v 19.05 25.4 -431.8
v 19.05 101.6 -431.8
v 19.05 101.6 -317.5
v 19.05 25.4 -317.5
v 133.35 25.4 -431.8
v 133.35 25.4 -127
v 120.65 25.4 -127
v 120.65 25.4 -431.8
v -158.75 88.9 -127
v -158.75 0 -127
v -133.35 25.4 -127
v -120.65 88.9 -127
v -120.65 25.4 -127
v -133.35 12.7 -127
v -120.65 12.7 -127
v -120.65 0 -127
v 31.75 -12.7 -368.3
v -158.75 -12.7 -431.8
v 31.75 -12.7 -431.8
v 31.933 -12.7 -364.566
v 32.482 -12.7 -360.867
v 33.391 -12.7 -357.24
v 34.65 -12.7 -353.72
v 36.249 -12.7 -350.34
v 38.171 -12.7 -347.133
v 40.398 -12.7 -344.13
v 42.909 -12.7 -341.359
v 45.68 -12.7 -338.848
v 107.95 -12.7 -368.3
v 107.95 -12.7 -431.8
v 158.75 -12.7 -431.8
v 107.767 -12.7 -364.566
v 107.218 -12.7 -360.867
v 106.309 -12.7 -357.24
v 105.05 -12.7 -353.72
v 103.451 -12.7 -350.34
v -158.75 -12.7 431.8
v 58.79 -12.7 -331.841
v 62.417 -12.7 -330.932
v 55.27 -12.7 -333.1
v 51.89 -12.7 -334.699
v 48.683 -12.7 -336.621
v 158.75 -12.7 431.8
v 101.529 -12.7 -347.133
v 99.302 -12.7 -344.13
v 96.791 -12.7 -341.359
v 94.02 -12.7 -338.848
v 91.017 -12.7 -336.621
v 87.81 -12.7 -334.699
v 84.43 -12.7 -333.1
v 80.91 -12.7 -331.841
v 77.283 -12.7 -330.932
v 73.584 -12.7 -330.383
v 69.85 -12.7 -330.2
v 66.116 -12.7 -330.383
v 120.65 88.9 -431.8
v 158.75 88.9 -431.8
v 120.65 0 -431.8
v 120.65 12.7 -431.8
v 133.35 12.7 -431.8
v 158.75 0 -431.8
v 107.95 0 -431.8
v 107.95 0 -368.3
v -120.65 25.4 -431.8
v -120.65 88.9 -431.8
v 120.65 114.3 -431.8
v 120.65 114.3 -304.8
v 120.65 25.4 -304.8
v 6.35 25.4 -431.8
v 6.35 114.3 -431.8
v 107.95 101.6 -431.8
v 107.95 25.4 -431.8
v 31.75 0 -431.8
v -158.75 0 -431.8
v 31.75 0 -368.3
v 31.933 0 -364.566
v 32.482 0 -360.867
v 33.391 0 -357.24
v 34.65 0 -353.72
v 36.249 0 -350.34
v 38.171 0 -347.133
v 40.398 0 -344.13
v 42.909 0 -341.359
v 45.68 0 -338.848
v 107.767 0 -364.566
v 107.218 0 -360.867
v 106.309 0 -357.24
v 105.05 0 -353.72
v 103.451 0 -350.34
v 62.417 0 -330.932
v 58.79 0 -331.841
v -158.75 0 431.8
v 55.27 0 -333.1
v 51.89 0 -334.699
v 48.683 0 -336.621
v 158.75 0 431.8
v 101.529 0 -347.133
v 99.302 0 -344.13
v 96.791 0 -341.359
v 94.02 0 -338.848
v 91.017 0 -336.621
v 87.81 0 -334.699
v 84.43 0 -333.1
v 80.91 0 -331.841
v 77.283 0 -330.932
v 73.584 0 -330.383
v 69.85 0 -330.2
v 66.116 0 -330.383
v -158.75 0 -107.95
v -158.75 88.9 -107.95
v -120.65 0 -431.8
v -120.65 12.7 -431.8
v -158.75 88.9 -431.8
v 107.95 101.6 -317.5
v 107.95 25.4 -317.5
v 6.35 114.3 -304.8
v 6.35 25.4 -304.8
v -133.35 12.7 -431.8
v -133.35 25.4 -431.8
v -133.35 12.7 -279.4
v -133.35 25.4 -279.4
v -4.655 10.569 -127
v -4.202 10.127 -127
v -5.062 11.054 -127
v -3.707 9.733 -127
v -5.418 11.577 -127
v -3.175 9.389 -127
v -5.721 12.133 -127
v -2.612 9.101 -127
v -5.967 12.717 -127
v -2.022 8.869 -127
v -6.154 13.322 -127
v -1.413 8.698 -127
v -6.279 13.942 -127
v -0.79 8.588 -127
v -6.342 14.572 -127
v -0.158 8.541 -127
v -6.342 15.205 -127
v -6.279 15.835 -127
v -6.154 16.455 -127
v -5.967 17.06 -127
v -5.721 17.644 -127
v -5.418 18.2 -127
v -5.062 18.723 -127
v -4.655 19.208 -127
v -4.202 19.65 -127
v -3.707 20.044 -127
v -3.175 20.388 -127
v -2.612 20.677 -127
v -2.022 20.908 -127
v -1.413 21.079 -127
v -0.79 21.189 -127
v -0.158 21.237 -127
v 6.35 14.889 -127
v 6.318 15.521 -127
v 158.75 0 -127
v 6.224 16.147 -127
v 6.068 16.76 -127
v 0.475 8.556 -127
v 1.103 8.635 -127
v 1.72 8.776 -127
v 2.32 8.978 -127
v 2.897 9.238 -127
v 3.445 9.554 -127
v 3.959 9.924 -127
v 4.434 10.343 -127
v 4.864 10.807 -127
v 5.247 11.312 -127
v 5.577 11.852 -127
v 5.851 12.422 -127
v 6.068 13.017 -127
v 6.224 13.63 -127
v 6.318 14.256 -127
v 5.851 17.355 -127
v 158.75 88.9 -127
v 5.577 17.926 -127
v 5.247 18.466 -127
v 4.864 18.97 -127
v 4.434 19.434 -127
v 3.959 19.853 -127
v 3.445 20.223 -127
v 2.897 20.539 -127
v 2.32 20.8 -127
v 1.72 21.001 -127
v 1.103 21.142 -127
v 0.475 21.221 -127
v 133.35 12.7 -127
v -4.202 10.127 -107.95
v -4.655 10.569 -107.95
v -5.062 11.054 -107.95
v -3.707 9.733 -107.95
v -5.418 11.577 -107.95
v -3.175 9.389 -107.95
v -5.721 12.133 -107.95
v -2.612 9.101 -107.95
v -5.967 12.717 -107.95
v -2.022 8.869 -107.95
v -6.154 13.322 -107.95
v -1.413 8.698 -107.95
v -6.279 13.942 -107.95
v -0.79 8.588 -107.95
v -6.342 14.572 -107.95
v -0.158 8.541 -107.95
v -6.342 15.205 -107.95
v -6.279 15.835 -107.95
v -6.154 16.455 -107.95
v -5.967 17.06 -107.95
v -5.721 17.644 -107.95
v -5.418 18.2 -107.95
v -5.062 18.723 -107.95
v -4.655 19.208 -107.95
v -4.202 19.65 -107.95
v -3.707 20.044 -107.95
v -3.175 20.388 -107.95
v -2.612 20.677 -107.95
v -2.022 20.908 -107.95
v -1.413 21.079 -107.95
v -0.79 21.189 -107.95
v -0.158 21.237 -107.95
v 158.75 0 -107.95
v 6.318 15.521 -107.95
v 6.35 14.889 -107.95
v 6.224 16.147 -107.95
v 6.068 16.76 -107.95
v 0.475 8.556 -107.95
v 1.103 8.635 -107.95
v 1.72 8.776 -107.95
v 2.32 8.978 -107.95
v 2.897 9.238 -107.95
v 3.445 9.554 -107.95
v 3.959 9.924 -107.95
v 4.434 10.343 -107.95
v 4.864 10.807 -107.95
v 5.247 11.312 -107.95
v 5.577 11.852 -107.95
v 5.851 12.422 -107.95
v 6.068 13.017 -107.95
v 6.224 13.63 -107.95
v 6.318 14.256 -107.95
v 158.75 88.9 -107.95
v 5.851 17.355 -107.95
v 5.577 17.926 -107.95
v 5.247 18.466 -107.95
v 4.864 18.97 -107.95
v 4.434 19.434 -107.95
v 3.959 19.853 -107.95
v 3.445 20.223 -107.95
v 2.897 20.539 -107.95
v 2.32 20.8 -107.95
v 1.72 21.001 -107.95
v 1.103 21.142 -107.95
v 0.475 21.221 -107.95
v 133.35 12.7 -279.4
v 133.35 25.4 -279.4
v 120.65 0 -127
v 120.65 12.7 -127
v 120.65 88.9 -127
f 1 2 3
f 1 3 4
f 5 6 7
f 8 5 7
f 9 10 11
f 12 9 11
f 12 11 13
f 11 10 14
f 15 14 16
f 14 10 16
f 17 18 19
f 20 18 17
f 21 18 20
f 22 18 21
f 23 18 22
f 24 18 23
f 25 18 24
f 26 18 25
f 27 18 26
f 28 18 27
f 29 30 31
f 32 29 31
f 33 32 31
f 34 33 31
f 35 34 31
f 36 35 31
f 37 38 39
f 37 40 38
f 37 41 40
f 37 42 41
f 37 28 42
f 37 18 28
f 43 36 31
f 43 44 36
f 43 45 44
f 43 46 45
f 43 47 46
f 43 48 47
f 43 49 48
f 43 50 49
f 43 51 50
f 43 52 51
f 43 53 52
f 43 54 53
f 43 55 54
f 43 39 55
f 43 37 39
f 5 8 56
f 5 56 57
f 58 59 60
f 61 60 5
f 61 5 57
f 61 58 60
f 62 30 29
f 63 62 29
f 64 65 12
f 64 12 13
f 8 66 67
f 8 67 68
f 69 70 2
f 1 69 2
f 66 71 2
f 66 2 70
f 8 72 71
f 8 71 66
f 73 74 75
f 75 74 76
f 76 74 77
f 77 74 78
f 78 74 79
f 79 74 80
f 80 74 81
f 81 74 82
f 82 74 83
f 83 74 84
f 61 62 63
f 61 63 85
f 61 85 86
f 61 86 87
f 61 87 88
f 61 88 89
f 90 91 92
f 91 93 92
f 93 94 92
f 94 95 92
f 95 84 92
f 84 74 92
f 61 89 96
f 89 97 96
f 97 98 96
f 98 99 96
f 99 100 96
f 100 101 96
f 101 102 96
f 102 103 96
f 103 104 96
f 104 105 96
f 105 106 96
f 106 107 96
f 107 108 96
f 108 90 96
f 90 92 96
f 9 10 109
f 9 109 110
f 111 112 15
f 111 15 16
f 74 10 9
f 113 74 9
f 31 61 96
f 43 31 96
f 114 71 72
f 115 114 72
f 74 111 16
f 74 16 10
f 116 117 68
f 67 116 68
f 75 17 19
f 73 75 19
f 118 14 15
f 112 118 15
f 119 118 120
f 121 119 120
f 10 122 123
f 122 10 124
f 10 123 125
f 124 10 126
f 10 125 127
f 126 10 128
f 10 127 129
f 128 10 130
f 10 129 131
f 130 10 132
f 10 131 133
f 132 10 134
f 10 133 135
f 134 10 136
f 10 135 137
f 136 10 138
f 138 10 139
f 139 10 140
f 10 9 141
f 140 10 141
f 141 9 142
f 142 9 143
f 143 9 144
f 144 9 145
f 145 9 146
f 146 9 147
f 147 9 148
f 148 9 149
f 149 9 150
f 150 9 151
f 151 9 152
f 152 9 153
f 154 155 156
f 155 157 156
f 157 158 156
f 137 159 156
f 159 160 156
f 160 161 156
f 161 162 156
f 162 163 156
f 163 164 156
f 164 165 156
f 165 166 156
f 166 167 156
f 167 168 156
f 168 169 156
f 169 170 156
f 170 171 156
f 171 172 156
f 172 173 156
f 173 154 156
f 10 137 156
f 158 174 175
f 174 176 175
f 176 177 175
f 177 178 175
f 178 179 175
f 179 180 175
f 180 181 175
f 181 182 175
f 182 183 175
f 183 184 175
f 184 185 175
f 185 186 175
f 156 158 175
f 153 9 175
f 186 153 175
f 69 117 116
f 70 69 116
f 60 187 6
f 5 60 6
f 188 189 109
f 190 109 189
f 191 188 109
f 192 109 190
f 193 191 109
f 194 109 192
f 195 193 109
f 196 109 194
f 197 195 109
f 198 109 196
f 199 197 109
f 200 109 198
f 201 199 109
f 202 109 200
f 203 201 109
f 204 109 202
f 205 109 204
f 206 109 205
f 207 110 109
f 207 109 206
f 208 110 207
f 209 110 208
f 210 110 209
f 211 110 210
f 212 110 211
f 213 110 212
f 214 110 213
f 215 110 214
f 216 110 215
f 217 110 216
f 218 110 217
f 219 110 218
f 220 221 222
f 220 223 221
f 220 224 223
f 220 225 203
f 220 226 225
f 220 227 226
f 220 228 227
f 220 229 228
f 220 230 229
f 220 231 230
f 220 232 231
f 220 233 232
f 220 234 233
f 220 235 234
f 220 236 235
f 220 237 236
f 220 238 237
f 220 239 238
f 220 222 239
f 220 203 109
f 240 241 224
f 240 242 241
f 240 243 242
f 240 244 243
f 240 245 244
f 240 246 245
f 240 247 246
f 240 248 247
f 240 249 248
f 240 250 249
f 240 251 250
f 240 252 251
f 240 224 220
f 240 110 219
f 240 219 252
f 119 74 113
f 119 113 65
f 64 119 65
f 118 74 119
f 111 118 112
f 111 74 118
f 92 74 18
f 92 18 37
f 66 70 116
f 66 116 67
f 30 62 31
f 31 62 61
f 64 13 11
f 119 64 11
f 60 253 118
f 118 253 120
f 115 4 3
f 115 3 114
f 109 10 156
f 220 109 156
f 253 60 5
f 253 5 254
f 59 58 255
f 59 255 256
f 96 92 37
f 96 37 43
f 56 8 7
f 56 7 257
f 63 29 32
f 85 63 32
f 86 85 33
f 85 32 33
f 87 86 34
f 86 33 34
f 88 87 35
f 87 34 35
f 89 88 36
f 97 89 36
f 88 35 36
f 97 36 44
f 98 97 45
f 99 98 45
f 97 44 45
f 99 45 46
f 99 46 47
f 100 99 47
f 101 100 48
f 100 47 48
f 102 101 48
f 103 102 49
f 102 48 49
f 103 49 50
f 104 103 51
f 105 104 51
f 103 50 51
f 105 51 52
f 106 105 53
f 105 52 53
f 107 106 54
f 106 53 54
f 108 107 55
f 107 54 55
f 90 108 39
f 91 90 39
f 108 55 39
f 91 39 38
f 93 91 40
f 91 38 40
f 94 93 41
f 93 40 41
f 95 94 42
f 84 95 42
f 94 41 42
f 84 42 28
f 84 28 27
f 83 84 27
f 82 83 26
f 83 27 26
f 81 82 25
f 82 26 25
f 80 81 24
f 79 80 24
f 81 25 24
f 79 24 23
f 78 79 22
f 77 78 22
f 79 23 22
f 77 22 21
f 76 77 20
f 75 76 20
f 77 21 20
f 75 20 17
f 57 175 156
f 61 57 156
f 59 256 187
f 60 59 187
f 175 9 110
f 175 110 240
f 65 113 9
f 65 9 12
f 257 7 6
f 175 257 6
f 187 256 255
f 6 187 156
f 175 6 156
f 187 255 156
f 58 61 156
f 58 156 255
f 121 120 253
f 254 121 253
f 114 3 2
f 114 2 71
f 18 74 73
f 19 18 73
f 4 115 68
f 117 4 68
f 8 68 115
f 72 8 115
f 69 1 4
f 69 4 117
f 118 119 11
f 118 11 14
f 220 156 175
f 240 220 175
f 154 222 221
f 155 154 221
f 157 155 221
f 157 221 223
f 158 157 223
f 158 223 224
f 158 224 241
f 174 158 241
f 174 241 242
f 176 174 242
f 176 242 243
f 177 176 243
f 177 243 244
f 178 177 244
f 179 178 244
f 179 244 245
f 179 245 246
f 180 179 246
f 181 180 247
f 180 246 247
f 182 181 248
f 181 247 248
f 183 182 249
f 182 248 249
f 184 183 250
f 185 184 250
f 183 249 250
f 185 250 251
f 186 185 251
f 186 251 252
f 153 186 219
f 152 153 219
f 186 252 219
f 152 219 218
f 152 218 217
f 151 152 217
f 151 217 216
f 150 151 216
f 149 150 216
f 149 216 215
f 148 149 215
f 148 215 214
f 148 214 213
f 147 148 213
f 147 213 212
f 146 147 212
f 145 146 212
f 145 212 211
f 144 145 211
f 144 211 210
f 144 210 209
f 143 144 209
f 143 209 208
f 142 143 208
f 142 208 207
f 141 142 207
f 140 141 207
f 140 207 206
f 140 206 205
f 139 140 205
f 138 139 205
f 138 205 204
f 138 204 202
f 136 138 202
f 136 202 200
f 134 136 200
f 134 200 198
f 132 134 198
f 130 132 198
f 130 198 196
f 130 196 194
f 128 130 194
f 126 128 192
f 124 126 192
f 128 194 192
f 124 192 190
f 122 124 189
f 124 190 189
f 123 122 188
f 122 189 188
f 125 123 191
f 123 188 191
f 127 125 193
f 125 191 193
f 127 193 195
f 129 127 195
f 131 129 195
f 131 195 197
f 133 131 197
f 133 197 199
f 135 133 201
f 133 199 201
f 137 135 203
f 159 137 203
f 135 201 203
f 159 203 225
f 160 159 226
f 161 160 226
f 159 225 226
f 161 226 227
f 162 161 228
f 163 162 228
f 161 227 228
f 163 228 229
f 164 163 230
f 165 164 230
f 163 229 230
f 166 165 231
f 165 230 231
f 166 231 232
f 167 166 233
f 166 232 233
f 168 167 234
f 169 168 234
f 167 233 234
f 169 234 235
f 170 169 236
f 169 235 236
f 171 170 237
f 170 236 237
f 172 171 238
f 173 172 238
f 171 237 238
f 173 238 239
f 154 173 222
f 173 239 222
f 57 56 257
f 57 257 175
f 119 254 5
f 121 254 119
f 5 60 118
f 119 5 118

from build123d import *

# Parameters (mm, degrees)
F0_W      = 317.5
F0_H      = 863.6
F1_DEPTH  = 12.7
F3_DEPTH  = 304.8
F4_W      = 254
F4_H      = 152.4
F4_W_2    = 12.7
F5_DEPTH  = 12.7
F7_DEPTH  = 12.7
F8_W      = 317.5
F8_H      = 88.9
F9_DEPTH  = 19.05
F10_R     = 6.35
F11_DEPTH = 25.4
F13_DEPTH = 127
F14_W     = 88.9
F14_H     = 76.2
F15_DEPTH = 114.3


with BuildPart() as f1:
    # F0 (on Front) → F1 (new body)
    with BuildSketch(Plane.XZ):
        Rectangle(F0_W, F0_H)
    extrude(amount=F1_DEPTH)

    # F6 (on face) → F7 (cut)
    with BuildSketch(Plane.XZ.offset(12.7)):
        with BuildLine():
            Line((31.75, -368.3), (31.75, -431.8))
            Line((31.75, -431.8), (107.95, -431.8))
            Line((107.95, -431.8), (107.95, -368.3))
            ThreePointArc((107.95, -368.3), (69.85, -330.2), (31.75, -368.3))
        make_face()
    extrude(amount=-F7_DEPTH, mode=Mode.SUBTRACT)


with BuildPart() as f3:
    # F2 (on face) → F3 (new body)
    with BuildSketch(Plane(origin=(0, 0, -431.8), x_dir=(1, 0, 0), z_dir=(0, 0, -1))):
        Polygon((-120.65, 0), (-158.75, 0), (-158.75, -88.9), (-120.65, -88.9), (-120.65, -25.4), (-133.35, -25.4), (-133.35, -12.7), (-120.65, -12.7), align=None)
    extrude(amount=-F3_DEPTH)


with BuildPart() as f3b:
    # F2 (on face) → F3, piece 2 (new body)
    with BuildSketch(Plane(origin=(0, 0, -431.8), x_dir=(1, 0, 0), z_dir=(0, 0, -1))):
        Polygon((133.35, -25.4), (120.65, -25.4), (120.65, -88.9), (158.75, -88.9), (158.75, 0), (120.65, 0), (120.65, -12.7), (133.35, -12.7), align=None)
    extrude(amount=-F3_DEPTH)


with BuildPart() as f5:
    # F4 (on face) → F5 (new body)
    with BuildSketch(Plane(origin=(0, 12.7, 0), x_dir=(-1, 0, 0), z_dir=(0, 1, 0))):
        with Locations((-6.35, -355.6)):
            Rectangle(F4_W, F4_H)
        with Locations((127, -355.6)):
            Rectangle(F4_W_2, F4_H)
    extrude(amount=F5_DEPTH)


with BuildPart() as f9:
    # F8 (on face) → F9 (new body)
    with BuildSketch(Plane.XY.offset(-127)):
        with Locations((0, 44.45)):
            Rectangle(F8_W, F8_H)
    extrude(amount=F9_DEPTH)

    # F10 (on face) → F11 (cut)
    with BuildSketch(Plane.XY.offset(-107.95)):
        with Locations((0, 14.8885902017)):
            Circle(F10_R)
    extrude(amount=-F11_DEPTH, mode=Mode.SUBTRACT)


with BuildPart() as f13:
    # F12 (on face) → F13 (new body)
    with BuildSketch(Plane(origin=(0, 0, -431.8), x_dir=(1, 0, 0), z_dir=(0, 0, -1))):
        Polygon((120.65, -25.4), (6.35, -25.4), (6.35, -114.3), (120.65, -114.3), (120.65, -88.9), align=None)
    extrude(amount=-F13_DEPTH)

    # F14 (on face) → F15 (cut)
    with BuildSketch(Plane(origin=(0, 0, -431.8), x_dir=(1, 0, 0), z_dir=(0, 0, -1))):
        with Locations((63.5, -63.5)):
            Rectangle(F14_W, F14_H)
    extrude(amount=-F15_DEPTH, mode=Mode.SUBTRACT)


solid = Compound([f1.part, f3.part, f3b.part, f5.part, f9.part, f13.part])
